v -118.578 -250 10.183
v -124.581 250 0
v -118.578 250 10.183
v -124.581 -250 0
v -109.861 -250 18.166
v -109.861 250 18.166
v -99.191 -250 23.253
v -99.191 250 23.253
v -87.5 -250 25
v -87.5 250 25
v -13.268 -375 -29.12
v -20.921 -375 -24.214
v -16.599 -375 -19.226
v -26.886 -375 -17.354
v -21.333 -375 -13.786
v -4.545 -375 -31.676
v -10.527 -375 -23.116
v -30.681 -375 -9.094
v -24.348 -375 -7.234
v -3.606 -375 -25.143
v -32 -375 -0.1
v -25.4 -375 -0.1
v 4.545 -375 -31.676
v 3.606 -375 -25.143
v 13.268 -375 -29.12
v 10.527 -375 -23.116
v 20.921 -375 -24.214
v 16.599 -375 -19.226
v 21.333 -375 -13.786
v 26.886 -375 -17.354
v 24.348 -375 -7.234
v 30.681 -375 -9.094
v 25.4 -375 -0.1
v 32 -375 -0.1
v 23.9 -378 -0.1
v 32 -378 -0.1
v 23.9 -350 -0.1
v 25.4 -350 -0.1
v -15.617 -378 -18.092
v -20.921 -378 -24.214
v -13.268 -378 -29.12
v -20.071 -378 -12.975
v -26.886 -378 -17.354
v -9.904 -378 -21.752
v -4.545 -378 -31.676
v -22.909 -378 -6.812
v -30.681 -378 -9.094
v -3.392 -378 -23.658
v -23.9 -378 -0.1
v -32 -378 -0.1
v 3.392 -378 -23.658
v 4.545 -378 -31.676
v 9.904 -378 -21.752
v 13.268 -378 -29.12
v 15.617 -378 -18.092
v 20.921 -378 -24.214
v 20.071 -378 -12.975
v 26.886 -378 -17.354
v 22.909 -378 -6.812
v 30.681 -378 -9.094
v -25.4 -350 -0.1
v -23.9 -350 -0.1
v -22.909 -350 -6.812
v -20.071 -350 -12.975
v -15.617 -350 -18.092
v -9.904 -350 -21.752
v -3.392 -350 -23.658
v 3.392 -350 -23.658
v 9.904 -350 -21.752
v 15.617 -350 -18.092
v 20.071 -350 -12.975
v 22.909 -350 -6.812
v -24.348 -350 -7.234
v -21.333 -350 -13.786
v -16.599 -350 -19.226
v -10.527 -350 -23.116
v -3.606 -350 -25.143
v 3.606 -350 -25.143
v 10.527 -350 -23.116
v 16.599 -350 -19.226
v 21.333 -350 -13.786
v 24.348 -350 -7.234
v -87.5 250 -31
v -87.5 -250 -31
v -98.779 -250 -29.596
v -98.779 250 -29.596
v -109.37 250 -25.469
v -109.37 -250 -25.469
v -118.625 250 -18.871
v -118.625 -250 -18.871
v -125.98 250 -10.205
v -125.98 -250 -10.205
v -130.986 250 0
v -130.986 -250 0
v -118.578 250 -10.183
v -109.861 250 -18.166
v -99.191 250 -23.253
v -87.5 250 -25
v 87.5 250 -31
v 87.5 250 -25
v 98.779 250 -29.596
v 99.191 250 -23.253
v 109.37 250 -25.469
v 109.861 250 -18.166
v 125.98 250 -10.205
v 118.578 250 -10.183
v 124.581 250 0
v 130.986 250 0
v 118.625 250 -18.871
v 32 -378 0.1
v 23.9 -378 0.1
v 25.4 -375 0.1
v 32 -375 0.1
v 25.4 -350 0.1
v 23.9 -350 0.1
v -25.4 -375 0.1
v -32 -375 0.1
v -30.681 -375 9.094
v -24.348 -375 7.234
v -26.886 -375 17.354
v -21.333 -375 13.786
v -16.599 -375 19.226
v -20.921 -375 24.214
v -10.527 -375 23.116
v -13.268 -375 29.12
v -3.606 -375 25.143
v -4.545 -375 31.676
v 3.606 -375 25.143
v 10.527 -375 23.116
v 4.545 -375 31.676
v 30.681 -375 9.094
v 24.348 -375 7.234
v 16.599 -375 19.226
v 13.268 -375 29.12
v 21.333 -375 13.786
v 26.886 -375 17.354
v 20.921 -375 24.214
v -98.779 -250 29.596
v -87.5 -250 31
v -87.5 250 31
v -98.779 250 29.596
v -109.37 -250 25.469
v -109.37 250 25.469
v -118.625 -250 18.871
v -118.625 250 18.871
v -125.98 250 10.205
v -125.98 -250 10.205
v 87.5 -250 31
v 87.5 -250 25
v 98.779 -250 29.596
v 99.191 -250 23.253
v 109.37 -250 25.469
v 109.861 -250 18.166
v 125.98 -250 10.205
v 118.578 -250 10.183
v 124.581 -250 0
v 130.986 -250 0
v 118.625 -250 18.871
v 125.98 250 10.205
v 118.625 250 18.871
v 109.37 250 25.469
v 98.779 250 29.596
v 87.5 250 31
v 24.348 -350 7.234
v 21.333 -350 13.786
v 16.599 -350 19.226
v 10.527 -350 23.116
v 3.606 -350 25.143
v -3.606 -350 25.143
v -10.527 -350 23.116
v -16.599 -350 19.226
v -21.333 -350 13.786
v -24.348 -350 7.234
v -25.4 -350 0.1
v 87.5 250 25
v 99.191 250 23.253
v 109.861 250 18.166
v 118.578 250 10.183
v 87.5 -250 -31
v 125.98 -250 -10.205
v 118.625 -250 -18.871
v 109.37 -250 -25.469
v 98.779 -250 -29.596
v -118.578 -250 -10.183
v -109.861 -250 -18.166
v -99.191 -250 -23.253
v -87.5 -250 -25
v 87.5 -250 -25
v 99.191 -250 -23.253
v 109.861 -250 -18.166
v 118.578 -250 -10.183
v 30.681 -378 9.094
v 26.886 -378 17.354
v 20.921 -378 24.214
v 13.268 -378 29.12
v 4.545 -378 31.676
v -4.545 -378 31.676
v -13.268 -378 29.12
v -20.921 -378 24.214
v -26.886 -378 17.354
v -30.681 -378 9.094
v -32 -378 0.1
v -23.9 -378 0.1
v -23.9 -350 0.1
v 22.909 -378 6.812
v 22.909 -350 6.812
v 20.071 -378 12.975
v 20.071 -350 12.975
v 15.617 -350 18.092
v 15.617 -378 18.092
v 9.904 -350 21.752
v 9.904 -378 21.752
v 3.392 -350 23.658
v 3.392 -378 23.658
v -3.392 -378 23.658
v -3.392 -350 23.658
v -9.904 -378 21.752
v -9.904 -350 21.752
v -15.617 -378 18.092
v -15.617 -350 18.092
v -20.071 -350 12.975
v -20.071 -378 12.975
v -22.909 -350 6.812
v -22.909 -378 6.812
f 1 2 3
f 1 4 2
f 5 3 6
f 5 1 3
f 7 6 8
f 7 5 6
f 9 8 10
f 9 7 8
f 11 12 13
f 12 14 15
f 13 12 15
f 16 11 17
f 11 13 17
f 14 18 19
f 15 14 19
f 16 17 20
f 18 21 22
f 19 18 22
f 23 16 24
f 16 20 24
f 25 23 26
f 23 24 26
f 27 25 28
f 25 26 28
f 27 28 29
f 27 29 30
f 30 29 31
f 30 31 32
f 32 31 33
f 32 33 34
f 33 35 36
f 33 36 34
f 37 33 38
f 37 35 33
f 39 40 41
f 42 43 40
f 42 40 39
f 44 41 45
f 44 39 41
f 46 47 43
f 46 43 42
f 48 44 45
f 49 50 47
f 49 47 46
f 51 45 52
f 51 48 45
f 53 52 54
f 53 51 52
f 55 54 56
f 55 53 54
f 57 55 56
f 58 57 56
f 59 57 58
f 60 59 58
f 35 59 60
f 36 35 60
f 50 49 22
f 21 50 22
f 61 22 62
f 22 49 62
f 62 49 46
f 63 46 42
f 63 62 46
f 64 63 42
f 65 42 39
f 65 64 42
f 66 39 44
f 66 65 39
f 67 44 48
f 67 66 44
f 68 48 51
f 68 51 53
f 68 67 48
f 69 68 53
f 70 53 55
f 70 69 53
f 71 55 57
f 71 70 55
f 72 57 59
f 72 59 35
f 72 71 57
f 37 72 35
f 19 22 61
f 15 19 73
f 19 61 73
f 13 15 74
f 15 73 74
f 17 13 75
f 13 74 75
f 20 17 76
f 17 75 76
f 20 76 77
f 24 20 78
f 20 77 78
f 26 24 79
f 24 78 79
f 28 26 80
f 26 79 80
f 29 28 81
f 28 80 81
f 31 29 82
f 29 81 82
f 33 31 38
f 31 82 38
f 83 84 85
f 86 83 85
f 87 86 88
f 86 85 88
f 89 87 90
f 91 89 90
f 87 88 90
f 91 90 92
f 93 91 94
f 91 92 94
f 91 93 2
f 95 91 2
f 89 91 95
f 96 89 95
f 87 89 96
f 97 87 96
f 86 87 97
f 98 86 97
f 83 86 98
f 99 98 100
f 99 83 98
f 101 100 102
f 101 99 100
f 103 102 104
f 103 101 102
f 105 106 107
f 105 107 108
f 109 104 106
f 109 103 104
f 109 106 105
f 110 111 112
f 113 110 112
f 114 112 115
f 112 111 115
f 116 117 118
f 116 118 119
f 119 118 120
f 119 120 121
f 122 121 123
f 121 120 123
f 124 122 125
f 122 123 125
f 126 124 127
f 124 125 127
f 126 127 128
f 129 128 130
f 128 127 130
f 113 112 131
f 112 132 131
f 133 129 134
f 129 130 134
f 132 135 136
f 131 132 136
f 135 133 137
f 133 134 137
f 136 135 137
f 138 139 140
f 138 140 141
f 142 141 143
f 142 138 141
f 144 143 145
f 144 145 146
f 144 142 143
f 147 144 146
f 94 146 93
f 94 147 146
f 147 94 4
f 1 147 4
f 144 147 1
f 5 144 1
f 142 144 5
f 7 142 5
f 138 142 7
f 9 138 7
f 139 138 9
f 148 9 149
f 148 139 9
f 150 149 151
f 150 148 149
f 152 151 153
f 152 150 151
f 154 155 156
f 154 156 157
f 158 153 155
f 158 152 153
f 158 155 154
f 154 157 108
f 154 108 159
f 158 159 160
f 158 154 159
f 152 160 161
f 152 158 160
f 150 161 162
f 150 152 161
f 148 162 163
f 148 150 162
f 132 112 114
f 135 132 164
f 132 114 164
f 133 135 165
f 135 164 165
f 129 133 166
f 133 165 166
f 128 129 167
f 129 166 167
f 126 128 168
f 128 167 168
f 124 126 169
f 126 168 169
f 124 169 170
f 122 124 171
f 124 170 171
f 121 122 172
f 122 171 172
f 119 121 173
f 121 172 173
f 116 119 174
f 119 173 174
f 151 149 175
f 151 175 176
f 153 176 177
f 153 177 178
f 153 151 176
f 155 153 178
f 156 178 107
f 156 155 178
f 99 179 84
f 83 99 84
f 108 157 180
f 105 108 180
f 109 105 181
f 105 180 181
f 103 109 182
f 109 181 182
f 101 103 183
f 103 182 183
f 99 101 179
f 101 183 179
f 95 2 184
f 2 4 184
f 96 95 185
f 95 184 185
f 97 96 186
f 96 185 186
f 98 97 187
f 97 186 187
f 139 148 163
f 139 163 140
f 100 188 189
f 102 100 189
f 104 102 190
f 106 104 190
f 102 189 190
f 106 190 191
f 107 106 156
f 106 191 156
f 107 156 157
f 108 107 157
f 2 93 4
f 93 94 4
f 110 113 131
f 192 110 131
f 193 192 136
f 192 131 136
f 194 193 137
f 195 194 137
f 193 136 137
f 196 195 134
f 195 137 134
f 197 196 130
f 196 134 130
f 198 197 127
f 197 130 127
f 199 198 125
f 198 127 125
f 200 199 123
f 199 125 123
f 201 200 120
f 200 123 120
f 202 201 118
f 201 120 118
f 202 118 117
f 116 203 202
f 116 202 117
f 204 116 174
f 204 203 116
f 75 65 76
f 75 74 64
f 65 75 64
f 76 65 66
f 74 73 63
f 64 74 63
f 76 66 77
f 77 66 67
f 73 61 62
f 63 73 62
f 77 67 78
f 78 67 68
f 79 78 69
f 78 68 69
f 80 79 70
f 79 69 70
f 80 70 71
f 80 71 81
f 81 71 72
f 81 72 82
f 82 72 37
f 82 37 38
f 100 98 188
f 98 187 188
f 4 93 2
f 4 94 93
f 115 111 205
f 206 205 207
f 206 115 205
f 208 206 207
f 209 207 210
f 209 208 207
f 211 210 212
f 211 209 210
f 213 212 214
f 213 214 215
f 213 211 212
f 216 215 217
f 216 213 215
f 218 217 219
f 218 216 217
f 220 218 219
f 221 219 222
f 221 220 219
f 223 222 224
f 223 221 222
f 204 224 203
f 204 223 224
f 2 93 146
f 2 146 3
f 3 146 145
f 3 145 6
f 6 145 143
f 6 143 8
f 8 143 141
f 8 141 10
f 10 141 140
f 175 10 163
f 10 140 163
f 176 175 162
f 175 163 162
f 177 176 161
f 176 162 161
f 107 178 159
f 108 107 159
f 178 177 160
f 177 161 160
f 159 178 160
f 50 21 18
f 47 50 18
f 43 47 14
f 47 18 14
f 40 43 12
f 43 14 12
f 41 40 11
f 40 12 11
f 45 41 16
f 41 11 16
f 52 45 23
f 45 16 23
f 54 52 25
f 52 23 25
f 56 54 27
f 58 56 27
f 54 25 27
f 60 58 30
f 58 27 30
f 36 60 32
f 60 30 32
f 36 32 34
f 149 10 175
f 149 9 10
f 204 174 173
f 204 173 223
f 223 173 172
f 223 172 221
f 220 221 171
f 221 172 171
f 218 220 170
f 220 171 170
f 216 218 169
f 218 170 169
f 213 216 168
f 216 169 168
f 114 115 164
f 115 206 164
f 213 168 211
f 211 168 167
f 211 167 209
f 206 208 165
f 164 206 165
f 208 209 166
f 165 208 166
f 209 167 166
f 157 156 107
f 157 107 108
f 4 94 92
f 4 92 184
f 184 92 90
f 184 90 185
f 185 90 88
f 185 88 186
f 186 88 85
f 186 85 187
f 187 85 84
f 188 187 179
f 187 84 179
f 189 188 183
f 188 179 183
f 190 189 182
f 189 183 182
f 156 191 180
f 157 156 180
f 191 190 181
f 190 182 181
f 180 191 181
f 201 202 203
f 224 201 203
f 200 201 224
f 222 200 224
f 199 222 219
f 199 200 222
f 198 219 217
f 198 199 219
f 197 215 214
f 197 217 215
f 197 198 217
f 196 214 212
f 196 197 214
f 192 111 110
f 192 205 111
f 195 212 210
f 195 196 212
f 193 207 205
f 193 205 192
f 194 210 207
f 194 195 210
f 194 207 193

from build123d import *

# Parameters (mm, degrees)
F1_DEPTH       = 250
F4_R           = 25.4
F4_R_2         = 23.9
F5_DEPTH       = 25
F6_R           = 32
F6_R_2         = 23.9
F7_DEPTH       = 3
F9_W           = 28
F9_H           = 0.1
F10_DEPTH      = 130.9866298103
F10_DEPTH_BACK = 130.9866298103


with BuildPart() as f1:
    # F0 (on Front) → F1 (new body, symmetric)
    with BuildSketch(Plane.XZ):
        with BuildLine():
            Line((-87.5, 25), (87.5, 25))
            ThreePointArc((87.5, 25), (109.860679775, 18.1662479036), (124.5809924355, 0))
            Line((124.5809924355, 0), (130.9856298103, 0))
            ThreePointArc((130.9856298103, 0), (114.2020598456, 22.4566416007), (87.5, 31))
            Line((87.5, 31), (-87.5, 31))
            ThreePointArc((-87.5, 31), (-114.2020598456, 22.4566416007), (-130.9856298103, 0))
            Line((-130.9856298103, 0), (-124.5809924355, 0))
            ThreePointArc((-124.5809924355, 0), (-109.860679775, 18.1662479036), (-87.5, 25))
        make_face()
    extrude(amount=F1_DEPTH, both=True)


with BuildPart() as f2_1:
    # F2: instance of F1
    add(f1.part.mirror(Plane(origin=(-127.7833111229, 0, 0), x_dir=(1, 0, 0), z_dir=(0, 0, -1))))


with BuildPart() as f5:
    # F4 (on offset) → F5 (new body)
    with BuildSketch(Plane.XZ.offset(350)):
        Circle(F4_R)
        Circle(F4_R_2, mode=Mode.SUBTRACT)
    extrude(amount=F5_DEPTH)

    # F6 (on face) → F7 (join)
    with BuildSketch(Plane.XZ.offset(375)):
        Circle(F6_R)
        Circle(F6_R_2, mode=Mode.SUBTRACT)
    extrude(amount=F7_DEPTH)

    # F9 (on Right) → F10 (cut, two sides)
    with BuildSketch(Plane.YZ) as f10_sk:
        with Locations((-364, -0.05)):
            Rectangle(F9_W, F9_H)
        with Locations((-364, 0.05)):
            Rectangle(F9_W, F9_H)
    extrude(amount=-F10_DEPTH, mode=Mode.SUBTRACT)
    extrude(f10_sk.sketch, amount=F10_DEPTH_BACK, mode=Mode.SUBTRACT)


solid = Compound([f1.part, f2_1.part, f5.part])
